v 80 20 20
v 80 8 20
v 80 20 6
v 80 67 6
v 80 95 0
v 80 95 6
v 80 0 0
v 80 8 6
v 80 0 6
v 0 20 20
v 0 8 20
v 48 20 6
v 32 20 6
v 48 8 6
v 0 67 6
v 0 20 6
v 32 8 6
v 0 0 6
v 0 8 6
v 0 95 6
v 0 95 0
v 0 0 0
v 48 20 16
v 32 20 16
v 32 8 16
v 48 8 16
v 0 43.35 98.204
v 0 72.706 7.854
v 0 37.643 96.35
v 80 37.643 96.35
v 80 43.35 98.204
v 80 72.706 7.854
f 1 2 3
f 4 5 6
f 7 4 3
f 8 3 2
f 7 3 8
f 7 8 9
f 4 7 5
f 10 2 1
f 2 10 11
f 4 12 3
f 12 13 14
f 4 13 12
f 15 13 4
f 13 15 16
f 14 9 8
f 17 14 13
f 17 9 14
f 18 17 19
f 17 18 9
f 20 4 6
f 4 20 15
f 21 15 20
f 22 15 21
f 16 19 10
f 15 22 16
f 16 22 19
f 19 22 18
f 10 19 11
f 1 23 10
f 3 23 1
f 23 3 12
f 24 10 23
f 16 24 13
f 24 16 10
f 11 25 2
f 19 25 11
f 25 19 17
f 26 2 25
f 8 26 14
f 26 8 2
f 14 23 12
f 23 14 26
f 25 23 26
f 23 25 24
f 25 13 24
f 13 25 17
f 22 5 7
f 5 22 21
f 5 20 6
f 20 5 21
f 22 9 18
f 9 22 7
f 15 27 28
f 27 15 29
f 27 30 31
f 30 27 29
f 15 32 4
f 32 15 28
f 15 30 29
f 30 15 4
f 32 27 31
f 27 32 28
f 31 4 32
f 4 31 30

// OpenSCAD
// Soporte para movil - OpenSCAD
// Unidades: mm
$fn = 64;

ancho = 80;
fondo = 95;
alto_trasero = 95;
grosor = 6;
angulo = 18;
tope_alto = 14;
tope_fondo = 12;
canal_ancho = 16;
canal_alto = 10;

module base() {
    cube([ancho, fondo, grosor], center=false);
}

module respaldo() {
    translate([0, fondo - 28, grosor])
        rotate([angulo, 0, 0])
            cube([ancho, grosor, alto_trasero], center=false);
}

module tope() {
    difference() {
        translate([0, 8, grosor])
            cube([ancho, tope_fondo, tope_alto], center=false);

        translate([ancho/2 - canal_ancho/2, 6, grosor])
            cube([canal_ancho, tope_fondo + 5, canal_alto], center=false);
    }
}

module soporte_movil() {
    union() {
        base();
        respaldo();
        tope();
    }
}

soporte_movil();

// Exportacion:
// 1. Pulsa F6.
// 2. File -> Export -> Export as STL.
// Modifica las medidas superiores para adaptar el soporte.
